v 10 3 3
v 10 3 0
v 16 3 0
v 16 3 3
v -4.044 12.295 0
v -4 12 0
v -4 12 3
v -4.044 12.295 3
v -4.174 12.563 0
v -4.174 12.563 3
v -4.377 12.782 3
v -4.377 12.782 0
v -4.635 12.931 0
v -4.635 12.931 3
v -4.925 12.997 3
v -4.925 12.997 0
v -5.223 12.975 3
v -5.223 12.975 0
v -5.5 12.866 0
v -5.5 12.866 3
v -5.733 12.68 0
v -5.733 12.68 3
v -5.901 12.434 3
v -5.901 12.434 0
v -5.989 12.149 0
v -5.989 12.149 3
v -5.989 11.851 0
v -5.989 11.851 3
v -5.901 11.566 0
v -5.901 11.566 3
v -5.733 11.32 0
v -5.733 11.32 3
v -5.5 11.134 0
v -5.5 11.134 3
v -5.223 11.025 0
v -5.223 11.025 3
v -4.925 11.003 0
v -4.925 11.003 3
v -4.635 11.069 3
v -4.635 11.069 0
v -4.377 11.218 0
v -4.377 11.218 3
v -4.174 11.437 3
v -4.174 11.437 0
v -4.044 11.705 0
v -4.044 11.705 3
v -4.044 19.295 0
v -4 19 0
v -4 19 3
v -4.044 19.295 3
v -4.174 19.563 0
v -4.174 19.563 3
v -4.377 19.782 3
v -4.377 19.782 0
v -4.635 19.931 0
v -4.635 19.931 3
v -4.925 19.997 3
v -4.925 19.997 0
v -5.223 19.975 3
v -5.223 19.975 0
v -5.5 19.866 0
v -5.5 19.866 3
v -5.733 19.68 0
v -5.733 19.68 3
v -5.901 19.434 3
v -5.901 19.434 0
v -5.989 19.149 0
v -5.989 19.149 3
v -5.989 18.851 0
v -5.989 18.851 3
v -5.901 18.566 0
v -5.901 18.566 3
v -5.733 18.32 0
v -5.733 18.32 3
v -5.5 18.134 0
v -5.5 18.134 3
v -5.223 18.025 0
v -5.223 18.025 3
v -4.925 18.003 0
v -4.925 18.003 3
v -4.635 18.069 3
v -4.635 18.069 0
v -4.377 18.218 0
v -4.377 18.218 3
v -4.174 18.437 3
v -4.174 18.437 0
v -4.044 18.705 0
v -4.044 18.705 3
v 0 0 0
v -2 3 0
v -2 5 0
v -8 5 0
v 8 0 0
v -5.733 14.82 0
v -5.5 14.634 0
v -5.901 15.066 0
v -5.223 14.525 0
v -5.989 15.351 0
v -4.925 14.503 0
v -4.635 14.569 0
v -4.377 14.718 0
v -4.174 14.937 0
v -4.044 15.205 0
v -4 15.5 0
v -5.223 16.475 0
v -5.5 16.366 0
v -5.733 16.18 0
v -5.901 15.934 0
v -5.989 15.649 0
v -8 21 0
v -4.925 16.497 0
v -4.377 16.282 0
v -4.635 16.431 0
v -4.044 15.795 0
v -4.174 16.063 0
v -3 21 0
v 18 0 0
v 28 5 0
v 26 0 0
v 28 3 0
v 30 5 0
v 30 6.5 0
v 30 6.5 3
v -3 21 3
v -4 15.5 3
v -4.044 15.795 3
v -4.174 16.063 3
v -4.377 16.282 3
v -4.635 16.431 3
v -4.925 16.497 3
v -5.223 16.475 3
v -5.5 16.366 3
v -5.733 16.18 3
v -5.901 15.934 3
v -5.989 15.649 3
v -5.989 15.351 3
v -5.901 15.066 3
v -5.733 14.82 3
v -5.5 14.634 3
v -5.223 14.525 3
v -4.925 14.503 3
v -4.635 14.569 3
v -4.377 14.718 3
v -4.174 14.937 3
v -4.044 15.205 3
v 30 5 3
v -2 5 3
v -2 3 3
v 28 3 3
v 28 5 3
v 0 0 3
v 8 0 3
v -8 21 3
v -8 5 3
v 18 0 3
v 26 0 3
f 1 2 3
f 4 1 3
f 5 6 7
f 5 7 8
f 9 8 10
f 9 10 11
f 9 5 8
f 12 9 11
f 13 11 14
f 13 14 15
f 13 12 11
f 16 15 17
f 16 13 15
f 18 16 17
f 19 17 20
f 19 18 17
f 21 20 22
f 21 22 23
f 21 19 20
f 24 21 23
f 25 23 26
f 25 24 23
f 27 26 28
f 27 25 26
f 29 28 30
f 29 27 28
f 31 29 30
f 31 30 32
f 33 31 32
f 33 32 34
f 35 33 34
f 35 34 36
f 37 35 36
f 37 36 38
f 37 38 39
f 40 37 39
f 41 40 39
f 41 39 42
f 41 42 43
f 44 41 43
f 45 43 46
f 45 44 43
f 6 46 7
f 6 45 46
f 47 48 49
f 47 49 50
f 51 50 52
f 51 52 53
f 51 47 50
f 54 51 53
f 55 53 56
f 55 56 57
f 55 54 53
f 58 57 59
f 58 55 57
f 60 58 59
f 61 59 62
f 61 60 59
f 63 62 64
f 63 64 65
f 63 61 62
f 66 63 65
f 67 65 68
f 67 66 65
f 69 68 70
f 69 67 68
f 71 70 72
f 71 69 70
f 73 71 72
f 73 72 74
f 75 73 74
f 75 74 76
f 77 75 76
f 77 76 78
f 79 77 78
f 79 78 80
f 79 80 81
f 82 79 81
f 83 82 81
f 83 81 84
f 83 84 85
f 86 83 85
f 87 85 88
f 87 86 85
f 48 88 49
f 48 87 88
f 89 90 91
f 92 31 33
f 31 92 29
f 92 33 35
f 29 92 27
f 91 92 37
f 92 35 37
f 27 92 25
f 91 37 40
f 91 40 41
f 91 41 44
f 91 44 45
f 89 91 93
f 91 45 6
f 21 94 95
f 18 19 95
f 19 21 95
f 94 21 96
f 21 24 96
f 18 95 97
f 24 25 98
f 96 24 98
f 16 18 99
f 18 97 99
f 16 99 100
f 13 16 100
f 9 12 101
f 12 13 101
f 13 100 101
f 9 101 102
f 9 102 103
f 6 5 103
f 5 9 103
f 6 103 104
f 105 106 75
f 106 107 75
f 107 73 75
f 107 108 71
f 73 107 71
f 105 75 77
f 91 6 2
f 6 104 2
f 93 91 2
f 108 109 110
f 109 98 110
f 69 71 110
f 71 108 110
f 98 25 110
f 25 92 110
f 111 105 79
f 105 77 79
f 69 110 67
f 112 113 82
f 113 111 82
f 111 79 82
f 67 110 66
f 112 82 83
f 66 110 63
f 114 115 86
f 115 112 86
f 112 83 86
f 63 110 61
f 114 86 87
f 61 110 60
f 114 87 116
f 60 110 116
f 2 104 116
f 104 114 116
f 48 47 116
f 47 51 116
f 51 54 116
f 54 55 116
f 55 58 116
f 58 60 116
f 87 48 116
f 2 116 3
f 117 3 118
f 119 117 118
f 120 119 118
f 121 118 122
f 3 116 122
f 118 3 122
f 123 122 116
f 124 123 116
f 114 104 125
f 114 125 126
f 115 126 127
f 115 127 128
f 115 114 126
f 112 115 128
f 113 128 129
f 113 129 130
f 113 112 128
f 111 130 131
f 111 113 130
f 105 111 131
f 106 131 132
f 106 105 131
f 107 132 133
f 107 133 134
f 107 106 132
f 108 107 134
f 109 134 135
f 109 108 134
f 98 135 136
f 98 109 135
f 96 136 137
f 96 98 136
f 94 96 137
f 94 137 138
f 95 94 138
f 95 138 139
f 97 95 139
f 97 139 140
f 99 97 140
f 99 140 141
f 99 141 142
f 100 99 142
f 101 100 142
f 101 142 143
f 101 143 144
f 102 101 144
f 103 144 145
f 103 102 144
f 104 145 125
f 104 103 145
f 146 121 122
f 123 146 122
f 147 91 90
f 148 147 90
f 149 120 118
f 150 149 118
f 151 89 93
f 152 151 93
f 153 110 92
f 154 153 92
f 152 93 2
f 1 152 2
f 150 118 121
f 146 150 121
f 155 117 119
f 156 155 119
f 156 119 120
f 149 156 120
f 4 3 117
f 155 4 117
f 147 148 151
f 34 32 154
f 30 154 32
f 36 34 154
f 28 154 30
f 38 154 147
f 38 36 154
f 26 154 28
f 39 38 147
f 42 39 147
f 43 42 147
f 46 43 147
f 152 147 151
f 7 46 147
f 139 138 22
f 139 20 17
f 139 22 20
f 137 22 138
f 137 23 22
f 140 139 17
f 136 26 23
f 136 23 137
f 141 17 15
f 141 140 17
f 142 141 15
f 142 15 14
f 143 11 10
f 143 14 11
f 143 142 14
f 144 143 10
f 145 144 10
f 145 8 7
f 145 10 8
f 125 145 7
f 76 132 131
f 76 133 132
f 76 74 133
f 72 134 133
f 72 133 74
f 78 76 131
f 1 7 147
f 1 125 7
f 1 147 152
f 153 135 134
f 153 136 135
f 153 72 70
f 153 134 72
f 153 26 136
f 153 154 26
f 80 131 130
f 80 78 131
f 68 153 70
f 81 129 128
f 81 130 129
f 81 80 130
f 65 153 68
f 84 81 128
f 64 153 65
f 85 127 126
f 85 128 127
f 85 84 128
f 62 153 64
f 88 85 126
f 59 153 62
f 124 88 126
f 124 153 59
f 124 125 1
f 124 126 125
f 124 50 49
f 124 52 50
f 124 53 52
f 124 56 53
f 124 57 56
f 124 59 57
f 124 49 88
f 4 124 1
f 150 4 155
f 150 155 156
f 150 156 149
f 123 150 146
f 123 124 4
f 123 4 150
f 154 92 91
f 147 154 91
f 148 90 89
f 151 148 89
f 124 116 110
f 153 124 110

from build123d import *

# Parameters (mm, degrees)
SKETCH_R  = 1
PAD_DEPTH = 3


with BuildPart() as part:
    # Sketch → Pad (new body)
    with BuildSketch(Plane.XY):
        Polygon((0, 0), (8, 0), (10, 3), (16, 3), (18, 0), (26, 0), (28, 3), (28, 5), (30, 5), (30, 6.5), (-3, 21), (-8, 21), (-8, 5), (-2, 5), (-2, 3), align=None)
        with Locations((-5, 19)):
            Circle(SKETCH_R, mode=Mode.SUBTRACT)
        with Locations((-5, 15.5)):
            Circle(SKETCH_R, mode=Mode.SUBTRACT)
        with Locations((-5, 12)):
            Circle(SKETCH_R, mode=Mode.SUBTRACT)
    extrude(amount=PAD_DEPTH)


solid = part.part
